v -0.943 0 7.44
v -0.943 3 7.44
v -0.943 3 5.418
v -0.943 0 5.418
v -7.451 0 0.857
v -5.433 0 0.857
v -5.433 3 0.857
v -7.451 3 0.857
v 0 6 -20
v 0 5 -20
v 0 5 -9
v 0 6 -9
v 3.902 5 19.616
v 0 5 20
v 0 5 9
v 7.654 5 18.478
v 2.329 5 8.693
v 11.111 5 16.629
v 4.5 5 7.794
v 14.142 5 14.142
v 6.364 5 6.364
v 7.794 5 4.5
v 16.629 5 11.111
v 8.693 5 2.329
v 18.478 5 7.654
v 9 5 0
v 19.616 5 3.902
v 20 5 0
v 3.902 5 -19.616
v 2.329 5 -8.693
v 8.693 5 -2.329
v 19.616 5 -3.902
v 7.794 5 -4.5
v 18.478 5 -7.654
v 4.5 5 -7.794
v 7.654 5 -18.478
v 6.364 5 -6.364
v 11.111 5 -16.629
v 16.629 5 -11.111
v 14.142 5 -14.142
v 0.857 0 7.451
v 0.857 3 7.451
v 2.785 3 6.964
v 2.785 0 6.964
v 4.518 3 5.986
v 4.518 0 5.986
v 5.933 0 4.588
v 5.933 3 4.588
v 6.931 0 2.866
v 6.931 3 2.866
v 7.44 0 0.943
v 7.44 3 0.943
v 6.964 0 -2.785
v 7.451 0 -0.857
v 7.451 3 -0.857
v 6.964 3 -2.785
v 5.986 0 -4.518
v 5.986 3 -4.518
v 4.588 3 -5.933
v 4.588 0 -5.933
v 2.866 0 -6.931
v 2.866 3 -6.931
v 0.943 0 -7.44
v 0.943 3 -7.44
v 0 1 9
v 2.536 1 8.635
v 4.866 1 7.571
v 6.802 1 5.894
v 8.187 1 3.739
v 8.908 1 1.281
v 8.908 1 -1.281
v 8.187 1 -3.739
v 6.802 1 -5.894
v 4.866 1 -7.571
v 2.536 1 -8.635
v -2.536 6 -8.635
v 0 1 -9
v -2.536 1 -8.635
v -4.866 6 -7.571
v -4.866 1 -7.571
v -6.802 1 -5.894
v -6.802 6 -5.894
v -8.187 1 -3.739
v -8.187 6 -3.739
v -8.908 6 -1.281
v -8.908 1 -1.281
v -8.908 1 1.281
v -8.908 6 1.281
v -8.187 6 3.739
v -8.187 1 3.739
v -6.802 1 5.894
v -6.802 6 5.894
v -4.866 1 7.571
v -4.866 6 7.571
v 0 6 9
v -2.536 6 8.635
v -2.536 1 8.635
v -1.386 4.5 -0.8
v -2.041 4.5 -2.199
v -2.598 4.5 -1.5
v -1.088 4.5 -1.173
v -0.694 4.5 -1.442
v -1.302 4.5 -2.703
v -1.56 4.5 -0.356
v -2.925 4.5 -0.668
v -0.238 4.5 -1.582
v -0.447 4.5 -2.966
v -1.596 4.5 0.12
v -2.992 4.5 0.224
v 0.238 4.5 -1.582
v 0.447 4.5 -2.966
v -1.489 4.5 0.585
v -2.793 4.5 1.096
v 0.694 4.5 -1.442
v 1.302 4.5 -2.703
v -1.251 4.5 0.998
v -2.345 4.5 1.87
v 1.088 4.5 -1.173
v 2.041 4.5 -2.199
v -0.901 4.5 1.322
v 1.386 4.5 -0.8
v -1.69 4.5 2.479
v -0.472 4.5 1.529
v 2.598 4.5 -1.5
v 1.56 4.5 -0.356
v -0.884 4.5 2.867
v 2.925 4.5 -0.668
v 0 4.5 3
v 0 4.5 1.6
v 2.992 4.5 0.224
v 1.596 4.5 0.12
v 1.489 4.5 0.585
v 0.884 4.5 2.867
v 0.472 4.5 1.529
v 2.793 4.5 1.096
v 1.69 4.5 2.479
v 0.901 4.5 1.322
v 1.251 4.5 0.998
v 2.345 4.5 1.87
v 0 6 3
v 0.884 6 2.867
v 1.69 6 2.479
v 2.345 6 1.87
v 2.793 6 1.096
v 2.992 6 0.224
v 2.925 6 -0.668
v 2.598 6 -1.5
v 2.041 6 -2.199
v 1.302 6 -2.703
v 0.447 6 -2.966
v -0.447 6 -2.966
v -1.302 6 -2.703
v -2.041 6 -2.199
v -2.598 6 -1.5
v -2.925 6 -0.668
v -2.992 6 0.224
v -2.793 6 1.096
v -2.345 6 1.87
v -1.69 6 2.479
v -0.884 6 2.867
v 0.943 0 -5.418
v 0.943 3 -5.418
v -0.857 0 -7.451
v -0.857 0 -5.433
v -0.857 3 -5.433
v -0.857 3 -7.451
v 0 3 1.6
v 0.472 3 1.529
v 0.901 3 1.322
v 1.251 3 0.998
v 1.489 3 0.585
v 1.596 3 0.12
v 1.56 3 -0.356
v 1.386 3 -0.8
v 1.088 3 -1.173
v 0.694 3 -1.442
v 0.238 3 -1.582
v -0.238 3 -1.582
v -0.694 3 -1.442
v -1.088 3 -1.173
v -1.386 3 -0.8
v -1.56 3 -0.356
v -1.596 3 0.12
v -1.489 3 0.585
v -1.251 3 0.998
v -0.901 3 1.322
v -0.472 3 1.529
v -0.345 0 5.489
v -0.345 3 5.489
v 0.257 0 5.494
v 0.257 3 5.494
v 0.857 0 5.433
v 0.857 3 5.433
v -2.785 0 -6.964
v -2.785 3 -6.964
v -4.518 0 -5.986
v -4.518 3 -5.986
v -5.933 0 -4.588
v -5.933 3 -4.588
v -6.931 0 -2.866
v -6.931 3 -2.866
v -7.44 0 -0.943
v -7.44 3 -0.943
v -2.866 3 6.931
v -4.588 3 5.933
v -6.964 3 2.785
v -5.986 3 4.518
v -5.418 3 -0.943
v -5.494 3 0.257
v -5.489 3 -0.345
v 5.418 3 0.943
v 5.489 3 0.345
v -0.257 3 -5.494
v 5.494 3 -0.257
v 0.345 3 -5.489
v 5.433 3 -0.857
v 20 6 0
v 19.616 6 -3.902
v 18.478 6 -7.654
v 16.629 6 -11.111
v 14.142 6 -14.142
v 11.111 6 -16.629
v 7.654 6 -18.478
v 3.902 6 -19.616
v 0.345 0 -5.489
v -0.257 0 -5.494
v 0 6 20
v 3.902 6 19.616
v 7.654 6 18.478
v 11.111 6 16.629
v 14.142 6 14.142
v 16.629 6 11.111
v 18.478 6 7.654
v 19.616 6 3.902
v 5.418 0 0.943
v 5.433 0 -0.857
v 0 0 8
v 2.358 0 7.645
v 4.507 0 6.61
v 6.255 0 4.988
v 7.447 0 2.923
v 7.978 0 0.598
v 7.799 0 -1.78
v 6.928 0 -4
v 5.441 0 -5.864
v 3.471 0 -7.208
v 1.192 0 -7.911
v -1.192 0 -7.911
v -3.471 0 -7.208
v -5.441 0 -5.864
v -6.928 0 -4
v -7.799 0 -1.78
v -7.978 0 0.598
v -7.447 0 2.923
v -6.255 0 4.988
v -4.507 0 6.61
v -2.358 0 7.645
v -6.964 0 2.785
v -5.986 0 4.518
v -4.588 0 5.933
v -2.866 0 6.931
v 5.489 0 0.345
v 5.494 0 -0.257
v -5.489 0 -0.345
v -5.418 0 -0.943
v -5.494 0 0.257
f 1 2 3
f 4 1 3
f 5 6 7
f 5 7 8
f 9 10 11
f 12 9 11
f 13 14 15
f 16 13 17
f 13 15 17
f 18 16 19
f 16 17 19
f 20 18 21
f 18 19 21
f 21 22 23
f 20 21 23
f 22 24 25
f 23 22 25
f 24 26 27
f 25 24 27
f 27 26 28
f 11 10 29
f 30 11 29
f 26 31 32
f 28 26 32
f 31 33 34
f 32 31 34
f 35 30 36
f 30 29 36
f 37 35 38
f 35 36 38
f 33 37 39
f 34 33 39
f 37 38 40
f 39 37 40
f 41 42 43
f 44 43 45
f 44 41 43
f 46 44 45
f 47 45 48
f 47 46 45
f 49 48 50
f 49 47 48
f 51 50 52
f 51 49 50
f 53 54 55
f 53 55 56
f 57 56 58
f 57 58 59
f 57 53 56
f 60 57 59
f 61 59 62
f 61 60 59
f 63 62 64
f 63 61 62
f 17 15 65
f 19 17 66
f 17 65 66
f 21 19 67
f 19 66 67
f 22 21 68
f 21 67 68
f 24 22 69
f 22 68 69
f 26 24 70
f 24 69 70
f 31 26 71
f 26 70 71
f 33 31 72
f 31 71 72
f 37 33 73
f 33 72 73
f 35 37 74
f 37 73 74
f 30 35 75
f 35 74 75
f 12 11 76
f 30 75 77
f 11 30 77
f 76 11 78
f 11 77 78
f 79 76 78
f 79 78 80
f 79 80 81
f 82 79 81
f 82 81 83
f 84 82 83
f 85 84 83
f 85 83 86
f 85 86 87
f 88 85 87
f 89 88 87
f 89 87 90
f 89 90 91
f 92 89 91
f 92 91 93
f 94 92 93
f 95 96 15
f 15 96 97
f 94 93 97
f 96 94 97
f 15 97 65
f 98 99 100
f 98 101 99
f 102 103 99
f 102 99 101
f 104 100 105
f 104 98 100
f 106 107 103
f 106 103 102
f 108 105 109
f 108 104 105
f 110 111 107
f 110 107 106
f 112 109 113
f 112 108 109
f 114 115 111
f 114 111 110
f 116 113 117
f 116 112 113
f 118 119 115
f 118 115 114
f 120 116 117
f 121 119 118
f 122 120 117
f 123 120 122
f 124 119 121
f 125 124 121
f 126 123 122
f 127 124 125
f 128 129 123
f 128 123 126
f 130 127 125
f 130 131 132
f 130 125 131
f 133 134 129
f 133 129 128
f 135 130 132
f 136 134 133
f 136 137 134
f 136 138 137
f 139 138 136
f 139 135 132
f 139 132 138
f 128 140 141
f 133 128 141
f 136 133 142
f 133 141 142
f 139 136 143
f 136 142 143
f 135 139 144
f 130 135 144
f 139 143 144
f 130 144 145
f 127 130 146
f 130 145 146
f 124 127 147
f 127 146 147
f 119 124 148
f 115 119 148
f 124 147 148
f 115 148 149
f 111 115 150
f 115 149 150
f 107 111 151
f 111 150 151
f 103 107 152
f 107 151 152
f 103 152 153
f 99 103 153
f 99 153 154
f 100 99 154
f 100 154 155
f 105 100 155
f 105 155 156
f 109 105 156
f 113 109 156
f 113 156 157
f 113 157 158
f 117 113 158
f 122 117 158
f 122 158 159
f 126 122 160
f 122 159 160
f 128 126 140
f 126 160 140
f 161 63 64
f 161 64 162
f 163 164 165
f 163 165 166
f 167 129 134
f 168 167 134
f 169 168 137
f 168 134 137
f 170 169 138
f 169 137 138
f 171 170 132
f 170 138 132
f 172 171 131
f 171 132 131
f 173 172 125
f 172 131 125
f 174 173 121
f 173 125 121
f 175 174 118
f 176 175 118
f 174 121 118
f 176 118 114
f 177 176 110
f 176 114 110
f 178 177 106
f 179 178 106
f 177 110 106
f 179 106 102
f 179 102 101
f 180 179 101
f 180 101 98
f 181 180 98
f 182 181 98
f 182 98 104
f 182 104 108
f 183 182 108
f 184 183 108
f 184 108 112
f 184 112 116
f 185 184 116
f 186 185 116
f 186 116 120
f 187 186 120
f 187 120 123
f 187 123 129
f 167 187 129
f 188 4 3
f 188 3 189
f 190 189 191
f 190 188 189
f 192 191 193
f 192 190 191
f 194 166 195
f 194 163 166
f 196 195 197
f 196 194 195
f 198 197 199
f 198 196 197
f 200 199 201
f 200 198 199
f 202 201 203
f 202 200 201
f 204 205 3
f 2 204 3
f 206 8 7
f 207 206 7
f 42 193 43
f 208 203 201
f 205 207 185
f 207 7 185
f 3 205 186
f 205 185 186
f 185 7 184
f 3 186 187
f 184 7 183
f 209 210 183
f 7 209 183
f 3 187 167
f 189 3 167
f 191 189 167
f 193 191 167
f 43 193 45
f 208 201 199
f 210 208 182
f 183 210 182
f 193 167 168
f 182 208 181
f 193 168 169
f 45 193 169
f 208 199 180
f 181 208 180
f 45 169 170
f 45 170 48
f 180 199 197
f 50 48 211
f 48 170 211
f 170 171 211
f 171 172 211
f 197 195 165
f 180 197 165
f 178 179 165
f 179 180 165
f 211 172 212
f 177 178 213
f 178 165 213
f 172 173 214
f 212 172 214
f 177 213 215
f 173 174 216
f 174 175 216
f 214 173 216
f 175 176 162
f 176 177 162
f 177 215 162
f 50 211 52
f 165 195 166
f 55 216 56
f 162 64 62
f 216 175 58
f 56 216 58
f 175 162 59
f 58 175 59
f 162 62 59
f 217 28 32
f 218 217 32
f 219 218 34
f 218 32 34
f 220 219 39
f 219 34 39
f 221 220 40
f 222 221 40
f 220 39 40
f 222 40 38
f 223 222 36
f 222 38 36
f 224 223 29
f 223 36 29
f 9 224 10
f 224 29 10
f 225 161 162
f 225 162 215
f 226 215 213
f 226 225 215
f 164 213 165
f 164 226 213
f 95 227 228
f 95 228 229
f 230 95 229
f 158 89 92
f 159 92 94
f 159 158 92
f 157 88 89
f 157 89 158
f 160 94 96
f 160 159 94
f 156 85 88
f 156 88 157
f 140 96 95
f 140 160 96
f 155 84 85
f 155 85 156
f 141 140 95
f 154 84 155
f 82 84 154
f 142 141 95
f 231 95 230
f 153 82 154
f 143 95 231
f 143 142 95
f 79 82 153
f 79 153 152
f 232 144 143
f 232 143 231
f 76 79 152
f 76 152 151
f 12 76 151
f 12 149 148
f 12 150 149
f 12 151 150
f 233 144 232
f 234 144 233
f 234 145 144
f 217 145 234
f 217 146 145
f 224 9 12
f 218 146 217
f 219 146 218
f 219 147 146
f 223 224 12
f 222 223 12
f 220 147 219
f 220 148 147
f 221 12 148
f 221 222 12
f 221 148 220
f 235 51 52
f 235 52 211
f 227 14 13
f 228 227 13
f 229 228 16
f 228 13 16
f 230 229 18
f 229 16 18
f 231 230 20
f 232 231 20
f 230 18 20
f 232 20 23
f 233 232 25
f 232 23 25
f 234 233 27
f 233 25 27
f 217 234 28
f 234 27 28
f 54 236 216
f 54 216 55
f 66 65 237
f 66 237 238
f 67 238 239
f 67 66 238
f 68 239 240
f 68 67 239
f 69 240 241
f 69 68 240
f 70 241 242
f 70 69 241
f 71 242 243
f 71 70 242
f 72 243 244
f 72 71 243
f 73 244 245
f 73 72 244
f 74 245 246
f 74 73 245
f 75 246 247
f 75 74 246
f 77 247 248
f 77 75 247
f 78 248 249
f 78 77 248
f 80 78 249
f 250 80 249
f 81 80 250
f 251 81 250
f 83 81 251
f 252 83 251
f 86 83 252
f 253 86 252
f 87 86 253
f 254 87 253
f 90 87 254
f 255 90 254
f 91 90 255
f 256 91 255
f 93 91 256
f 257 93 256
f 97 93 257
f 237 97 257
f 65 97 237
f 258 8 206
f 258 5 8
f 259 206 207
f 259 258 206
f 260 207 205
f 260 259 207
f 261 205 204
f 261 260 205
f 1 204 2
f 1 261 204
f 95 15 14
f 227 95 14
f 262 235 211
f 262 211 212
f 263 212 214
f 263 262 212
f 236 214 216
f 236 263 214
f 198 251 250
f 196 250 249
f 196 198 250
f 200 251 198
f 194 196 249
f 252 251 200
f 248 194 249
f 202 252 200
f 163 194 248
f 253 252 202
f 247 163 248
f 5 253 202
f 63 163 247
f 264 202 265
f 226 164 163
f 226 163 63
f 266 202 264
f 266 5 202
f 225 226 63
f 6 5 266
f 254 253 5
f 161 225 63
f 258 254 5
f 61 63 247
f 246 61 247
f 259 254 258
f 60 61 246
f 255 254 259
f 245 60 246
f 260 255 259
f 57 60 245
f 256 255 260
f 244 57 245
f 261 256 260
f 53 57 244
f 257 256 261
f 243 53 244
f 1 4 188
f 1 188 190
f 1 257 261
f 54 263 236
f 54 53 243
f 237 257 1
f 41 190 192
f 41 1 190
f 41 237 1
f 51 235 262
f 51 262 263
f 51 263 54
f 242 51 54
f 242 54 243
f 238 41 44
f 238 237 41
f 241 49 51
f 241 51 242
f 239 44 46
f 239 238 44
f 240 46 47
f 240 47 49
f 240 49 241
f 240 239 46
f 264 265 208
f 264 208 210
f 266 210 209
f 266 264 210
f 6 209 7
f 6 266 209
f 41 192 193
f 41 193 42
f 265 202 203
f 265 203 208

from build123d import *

# Parameters (mm, degrees)
SKETCH_1_R          = 9
SKETCH_1_R_2        = 7.5
EXTRUDE_1_DEPTH     = 6
EXTRUDE_START       = -1
EXTRUDE_2_DEPTH     = 1
EXTRUDE_3_DEPTH     = 3
EXTRUDE_START_2     = -3
SKETCH_5_R          = 7.5
EXTRUDE_4_DEPTH     = 3
SKETCH_6_R          = 1.6
CUT_EXTRUDE_1_DEPTH = 3
SKETCH_7_R          = 3
CUT_EXTRUDE_2_DEPTH = 1.5
CHAMFER_1_SIZE      = 1


with BuildPart() as part:
    # 草图1 → 凸台-拉伸1 (new body)
    with BuildSketch(Plane(origin=(0, 0, 0), x_dir=(1, 0, 0), z_dir=(0, 1, 0))):
        with Locations(Location((0, 0, 0), (0, 0, 270))):
            Circle(SKETCH_1_R)
        with Locations(Location((0, 0, 0), (0, 0, 270))):
            Circle(SKETCH_1_R_2, mode=Mode.SUBTRACT)
    extrude(amount=EXTRUDE_1_DEPTH)

    # 草图2 → 凸台-拉伸2 (add)
    with BuildSketch(Plane(origin=(0, 6, 0), x_dir=(1, 0, 0), z_dir=(0, 1, 0)).offset(EXTRUDE_START)):
        with BuildLine():
            Line((0, 20), (0, 9))
            ThreePointArc((0, 9), (6.363961031, 6.363961031), (9, 0))
            ThreePointArc((9, 0), (6.363961031, -6.363961031), (0, -9))
            Line((0, -9), (0, -20))
            ThreePointArc((0, -20), (14.142135624, -14.142135624), (20, 0))
            ThreePointArc((20, 0), (14.142135624, 14.142135624), (0, 20))
        make_face()
    extrude(amount=EXTRUDE_2_DEPTH)

    # 草图4 → 凸台-拉伸3 (add)
    with BuildSketch(Plane.XZ):
        with BuildLine():
            Line((0.856553191, 6.326082651), (0.856553191, 7.450927233))
            ThreePointArc((0.856553191, 7.450927233), (-0.043739259, 7.499872457), (-0.943399591, 7.440429908))
            Line((-0.943399591, 7.440429908), (-0.943399591, 6.312339741))
            Line((-0.943399591, 6.312339741), (-0.943399591, 5.418486616))
            ThreePointArc((-0.943399591, 5.418486616), (-0.044016518, 5.499823865), (0.856553191, 5.432892106))
            Line((0.856553191, 5.432892106), (0.856553191, 6.326082651))
        make_face()
        with BuildLine():
            Line((6.312339741, 0.943399591), (5.418486616, 0.943399591))
            ThreePointArc((5.418486616, 0.943399591), (5.499823865, 0.044016518), (5.432892106, -0.856553191))
            Line((5.432892106, -0.856553191), (6.326082651, -0.856553191))
            Line((6.326082651, -0.856553191), (7.450927233, -0.856553191))
            ThreePointArc((7.450927233, -0.856553191), (7.499872457, 0.043739259), (7.440429908, 0.943399591))
            Line((7.440429908, 0.943399591), (6.312339741, 0.943399591))
        make_face()
        with BuildLine():
            Line((0.943399591, -6.312339741), (0.943399591, -5.418486616))
            ThreePointArc((0.943399591, -5.418486616), (0.044016518, -5.499823865), (-0.856553191, -5.432892106))
            Line((-0.856553191, -5.432892106), (-0.856553191, -6.326082651))
            Line((-0.856553191, -6.326082651), (-0.856553191, -7.450927233))
            ThreePointArc((-0.856553191, -7.450927233), (0.043739259, -7.499872457), (0.943399591, -7.440429908))
            Line((0.943399591, -7.440429908), (0.943399591, -6.312339741))
        make_face()
        with BuildLine():
            Line((-6.312339741, -0.943399591), (-5.418486616, -0.943399591))
            ThreePointArc((-5.418486616, -0.943399591), (-5.499823865, -0.044016518), (-5.432892106, 0.856553191))
            Line((-5.432892106, 0.856553191), (-6.326082651, 0.856553191))
            Line((-6.326082651, 0.856553191), (-7.450927233, 0.856553191))
            ThreePointArc((-7.450927233, 0.856553191), (-7.499872457, -0.043739259), (-7.440429908, -0.943399591))
            Line((-7.440429908, -0.943399591), (-6.312339741, -0.943399591))
        make_face()
    extrude(amount=-EXTRUDE_3_DEPTH)

    # 草图5 → 凸台-拉伸4 (add)
    with BuildSketch(Plane(origin=(0, 6, 0), x_dir=(1, 0, 0), z_dir=(0, 1, 0)).offset(EXTRUDE_START_2)):
        Circle(SKETCH_5_R)
    extrude(amount=EXTRUDE_4_DEPTH)

    # 草图6 → 切除-拉伸1 (cut)
    with BuildSketch(Plane(origin=(0, 6, 0), x_dir=(1, 0, 0), z_dir=(0, 1, 0))):
        with Locations(Location((0, 0, 0), (0, 0, 270))):
            Circle(SKETCH_6_R)
    extrude(amount=-CUT_EXTRUDE_1_DEPTH, mode=Mode.SUBTRACT)

    # 草图7 → 切除-拉伸2 (cut)
    with BuildSketch(Plane(origin=(0, 6, 0), x_dir=(1, 0, 0), z_dir=(0, 1, 0))):
        with Locations(Location((0, 0, 0), (0, 0, 270))):
            Circle(SKETCH_7_R)
    extrude(amount=-CUT_EXTRUDE_2_DEPTH, mode=Mode.SUBTRACT)

    # 倒角1
    chamfer_1_edges = [part.edges().sort_by_distance(p)[0] for p in [
        (0, 0, -9),
    ]]
    chamfer(chamfer_1_edges, length=CHAMFER_1_SIZE)


solid = part.part
